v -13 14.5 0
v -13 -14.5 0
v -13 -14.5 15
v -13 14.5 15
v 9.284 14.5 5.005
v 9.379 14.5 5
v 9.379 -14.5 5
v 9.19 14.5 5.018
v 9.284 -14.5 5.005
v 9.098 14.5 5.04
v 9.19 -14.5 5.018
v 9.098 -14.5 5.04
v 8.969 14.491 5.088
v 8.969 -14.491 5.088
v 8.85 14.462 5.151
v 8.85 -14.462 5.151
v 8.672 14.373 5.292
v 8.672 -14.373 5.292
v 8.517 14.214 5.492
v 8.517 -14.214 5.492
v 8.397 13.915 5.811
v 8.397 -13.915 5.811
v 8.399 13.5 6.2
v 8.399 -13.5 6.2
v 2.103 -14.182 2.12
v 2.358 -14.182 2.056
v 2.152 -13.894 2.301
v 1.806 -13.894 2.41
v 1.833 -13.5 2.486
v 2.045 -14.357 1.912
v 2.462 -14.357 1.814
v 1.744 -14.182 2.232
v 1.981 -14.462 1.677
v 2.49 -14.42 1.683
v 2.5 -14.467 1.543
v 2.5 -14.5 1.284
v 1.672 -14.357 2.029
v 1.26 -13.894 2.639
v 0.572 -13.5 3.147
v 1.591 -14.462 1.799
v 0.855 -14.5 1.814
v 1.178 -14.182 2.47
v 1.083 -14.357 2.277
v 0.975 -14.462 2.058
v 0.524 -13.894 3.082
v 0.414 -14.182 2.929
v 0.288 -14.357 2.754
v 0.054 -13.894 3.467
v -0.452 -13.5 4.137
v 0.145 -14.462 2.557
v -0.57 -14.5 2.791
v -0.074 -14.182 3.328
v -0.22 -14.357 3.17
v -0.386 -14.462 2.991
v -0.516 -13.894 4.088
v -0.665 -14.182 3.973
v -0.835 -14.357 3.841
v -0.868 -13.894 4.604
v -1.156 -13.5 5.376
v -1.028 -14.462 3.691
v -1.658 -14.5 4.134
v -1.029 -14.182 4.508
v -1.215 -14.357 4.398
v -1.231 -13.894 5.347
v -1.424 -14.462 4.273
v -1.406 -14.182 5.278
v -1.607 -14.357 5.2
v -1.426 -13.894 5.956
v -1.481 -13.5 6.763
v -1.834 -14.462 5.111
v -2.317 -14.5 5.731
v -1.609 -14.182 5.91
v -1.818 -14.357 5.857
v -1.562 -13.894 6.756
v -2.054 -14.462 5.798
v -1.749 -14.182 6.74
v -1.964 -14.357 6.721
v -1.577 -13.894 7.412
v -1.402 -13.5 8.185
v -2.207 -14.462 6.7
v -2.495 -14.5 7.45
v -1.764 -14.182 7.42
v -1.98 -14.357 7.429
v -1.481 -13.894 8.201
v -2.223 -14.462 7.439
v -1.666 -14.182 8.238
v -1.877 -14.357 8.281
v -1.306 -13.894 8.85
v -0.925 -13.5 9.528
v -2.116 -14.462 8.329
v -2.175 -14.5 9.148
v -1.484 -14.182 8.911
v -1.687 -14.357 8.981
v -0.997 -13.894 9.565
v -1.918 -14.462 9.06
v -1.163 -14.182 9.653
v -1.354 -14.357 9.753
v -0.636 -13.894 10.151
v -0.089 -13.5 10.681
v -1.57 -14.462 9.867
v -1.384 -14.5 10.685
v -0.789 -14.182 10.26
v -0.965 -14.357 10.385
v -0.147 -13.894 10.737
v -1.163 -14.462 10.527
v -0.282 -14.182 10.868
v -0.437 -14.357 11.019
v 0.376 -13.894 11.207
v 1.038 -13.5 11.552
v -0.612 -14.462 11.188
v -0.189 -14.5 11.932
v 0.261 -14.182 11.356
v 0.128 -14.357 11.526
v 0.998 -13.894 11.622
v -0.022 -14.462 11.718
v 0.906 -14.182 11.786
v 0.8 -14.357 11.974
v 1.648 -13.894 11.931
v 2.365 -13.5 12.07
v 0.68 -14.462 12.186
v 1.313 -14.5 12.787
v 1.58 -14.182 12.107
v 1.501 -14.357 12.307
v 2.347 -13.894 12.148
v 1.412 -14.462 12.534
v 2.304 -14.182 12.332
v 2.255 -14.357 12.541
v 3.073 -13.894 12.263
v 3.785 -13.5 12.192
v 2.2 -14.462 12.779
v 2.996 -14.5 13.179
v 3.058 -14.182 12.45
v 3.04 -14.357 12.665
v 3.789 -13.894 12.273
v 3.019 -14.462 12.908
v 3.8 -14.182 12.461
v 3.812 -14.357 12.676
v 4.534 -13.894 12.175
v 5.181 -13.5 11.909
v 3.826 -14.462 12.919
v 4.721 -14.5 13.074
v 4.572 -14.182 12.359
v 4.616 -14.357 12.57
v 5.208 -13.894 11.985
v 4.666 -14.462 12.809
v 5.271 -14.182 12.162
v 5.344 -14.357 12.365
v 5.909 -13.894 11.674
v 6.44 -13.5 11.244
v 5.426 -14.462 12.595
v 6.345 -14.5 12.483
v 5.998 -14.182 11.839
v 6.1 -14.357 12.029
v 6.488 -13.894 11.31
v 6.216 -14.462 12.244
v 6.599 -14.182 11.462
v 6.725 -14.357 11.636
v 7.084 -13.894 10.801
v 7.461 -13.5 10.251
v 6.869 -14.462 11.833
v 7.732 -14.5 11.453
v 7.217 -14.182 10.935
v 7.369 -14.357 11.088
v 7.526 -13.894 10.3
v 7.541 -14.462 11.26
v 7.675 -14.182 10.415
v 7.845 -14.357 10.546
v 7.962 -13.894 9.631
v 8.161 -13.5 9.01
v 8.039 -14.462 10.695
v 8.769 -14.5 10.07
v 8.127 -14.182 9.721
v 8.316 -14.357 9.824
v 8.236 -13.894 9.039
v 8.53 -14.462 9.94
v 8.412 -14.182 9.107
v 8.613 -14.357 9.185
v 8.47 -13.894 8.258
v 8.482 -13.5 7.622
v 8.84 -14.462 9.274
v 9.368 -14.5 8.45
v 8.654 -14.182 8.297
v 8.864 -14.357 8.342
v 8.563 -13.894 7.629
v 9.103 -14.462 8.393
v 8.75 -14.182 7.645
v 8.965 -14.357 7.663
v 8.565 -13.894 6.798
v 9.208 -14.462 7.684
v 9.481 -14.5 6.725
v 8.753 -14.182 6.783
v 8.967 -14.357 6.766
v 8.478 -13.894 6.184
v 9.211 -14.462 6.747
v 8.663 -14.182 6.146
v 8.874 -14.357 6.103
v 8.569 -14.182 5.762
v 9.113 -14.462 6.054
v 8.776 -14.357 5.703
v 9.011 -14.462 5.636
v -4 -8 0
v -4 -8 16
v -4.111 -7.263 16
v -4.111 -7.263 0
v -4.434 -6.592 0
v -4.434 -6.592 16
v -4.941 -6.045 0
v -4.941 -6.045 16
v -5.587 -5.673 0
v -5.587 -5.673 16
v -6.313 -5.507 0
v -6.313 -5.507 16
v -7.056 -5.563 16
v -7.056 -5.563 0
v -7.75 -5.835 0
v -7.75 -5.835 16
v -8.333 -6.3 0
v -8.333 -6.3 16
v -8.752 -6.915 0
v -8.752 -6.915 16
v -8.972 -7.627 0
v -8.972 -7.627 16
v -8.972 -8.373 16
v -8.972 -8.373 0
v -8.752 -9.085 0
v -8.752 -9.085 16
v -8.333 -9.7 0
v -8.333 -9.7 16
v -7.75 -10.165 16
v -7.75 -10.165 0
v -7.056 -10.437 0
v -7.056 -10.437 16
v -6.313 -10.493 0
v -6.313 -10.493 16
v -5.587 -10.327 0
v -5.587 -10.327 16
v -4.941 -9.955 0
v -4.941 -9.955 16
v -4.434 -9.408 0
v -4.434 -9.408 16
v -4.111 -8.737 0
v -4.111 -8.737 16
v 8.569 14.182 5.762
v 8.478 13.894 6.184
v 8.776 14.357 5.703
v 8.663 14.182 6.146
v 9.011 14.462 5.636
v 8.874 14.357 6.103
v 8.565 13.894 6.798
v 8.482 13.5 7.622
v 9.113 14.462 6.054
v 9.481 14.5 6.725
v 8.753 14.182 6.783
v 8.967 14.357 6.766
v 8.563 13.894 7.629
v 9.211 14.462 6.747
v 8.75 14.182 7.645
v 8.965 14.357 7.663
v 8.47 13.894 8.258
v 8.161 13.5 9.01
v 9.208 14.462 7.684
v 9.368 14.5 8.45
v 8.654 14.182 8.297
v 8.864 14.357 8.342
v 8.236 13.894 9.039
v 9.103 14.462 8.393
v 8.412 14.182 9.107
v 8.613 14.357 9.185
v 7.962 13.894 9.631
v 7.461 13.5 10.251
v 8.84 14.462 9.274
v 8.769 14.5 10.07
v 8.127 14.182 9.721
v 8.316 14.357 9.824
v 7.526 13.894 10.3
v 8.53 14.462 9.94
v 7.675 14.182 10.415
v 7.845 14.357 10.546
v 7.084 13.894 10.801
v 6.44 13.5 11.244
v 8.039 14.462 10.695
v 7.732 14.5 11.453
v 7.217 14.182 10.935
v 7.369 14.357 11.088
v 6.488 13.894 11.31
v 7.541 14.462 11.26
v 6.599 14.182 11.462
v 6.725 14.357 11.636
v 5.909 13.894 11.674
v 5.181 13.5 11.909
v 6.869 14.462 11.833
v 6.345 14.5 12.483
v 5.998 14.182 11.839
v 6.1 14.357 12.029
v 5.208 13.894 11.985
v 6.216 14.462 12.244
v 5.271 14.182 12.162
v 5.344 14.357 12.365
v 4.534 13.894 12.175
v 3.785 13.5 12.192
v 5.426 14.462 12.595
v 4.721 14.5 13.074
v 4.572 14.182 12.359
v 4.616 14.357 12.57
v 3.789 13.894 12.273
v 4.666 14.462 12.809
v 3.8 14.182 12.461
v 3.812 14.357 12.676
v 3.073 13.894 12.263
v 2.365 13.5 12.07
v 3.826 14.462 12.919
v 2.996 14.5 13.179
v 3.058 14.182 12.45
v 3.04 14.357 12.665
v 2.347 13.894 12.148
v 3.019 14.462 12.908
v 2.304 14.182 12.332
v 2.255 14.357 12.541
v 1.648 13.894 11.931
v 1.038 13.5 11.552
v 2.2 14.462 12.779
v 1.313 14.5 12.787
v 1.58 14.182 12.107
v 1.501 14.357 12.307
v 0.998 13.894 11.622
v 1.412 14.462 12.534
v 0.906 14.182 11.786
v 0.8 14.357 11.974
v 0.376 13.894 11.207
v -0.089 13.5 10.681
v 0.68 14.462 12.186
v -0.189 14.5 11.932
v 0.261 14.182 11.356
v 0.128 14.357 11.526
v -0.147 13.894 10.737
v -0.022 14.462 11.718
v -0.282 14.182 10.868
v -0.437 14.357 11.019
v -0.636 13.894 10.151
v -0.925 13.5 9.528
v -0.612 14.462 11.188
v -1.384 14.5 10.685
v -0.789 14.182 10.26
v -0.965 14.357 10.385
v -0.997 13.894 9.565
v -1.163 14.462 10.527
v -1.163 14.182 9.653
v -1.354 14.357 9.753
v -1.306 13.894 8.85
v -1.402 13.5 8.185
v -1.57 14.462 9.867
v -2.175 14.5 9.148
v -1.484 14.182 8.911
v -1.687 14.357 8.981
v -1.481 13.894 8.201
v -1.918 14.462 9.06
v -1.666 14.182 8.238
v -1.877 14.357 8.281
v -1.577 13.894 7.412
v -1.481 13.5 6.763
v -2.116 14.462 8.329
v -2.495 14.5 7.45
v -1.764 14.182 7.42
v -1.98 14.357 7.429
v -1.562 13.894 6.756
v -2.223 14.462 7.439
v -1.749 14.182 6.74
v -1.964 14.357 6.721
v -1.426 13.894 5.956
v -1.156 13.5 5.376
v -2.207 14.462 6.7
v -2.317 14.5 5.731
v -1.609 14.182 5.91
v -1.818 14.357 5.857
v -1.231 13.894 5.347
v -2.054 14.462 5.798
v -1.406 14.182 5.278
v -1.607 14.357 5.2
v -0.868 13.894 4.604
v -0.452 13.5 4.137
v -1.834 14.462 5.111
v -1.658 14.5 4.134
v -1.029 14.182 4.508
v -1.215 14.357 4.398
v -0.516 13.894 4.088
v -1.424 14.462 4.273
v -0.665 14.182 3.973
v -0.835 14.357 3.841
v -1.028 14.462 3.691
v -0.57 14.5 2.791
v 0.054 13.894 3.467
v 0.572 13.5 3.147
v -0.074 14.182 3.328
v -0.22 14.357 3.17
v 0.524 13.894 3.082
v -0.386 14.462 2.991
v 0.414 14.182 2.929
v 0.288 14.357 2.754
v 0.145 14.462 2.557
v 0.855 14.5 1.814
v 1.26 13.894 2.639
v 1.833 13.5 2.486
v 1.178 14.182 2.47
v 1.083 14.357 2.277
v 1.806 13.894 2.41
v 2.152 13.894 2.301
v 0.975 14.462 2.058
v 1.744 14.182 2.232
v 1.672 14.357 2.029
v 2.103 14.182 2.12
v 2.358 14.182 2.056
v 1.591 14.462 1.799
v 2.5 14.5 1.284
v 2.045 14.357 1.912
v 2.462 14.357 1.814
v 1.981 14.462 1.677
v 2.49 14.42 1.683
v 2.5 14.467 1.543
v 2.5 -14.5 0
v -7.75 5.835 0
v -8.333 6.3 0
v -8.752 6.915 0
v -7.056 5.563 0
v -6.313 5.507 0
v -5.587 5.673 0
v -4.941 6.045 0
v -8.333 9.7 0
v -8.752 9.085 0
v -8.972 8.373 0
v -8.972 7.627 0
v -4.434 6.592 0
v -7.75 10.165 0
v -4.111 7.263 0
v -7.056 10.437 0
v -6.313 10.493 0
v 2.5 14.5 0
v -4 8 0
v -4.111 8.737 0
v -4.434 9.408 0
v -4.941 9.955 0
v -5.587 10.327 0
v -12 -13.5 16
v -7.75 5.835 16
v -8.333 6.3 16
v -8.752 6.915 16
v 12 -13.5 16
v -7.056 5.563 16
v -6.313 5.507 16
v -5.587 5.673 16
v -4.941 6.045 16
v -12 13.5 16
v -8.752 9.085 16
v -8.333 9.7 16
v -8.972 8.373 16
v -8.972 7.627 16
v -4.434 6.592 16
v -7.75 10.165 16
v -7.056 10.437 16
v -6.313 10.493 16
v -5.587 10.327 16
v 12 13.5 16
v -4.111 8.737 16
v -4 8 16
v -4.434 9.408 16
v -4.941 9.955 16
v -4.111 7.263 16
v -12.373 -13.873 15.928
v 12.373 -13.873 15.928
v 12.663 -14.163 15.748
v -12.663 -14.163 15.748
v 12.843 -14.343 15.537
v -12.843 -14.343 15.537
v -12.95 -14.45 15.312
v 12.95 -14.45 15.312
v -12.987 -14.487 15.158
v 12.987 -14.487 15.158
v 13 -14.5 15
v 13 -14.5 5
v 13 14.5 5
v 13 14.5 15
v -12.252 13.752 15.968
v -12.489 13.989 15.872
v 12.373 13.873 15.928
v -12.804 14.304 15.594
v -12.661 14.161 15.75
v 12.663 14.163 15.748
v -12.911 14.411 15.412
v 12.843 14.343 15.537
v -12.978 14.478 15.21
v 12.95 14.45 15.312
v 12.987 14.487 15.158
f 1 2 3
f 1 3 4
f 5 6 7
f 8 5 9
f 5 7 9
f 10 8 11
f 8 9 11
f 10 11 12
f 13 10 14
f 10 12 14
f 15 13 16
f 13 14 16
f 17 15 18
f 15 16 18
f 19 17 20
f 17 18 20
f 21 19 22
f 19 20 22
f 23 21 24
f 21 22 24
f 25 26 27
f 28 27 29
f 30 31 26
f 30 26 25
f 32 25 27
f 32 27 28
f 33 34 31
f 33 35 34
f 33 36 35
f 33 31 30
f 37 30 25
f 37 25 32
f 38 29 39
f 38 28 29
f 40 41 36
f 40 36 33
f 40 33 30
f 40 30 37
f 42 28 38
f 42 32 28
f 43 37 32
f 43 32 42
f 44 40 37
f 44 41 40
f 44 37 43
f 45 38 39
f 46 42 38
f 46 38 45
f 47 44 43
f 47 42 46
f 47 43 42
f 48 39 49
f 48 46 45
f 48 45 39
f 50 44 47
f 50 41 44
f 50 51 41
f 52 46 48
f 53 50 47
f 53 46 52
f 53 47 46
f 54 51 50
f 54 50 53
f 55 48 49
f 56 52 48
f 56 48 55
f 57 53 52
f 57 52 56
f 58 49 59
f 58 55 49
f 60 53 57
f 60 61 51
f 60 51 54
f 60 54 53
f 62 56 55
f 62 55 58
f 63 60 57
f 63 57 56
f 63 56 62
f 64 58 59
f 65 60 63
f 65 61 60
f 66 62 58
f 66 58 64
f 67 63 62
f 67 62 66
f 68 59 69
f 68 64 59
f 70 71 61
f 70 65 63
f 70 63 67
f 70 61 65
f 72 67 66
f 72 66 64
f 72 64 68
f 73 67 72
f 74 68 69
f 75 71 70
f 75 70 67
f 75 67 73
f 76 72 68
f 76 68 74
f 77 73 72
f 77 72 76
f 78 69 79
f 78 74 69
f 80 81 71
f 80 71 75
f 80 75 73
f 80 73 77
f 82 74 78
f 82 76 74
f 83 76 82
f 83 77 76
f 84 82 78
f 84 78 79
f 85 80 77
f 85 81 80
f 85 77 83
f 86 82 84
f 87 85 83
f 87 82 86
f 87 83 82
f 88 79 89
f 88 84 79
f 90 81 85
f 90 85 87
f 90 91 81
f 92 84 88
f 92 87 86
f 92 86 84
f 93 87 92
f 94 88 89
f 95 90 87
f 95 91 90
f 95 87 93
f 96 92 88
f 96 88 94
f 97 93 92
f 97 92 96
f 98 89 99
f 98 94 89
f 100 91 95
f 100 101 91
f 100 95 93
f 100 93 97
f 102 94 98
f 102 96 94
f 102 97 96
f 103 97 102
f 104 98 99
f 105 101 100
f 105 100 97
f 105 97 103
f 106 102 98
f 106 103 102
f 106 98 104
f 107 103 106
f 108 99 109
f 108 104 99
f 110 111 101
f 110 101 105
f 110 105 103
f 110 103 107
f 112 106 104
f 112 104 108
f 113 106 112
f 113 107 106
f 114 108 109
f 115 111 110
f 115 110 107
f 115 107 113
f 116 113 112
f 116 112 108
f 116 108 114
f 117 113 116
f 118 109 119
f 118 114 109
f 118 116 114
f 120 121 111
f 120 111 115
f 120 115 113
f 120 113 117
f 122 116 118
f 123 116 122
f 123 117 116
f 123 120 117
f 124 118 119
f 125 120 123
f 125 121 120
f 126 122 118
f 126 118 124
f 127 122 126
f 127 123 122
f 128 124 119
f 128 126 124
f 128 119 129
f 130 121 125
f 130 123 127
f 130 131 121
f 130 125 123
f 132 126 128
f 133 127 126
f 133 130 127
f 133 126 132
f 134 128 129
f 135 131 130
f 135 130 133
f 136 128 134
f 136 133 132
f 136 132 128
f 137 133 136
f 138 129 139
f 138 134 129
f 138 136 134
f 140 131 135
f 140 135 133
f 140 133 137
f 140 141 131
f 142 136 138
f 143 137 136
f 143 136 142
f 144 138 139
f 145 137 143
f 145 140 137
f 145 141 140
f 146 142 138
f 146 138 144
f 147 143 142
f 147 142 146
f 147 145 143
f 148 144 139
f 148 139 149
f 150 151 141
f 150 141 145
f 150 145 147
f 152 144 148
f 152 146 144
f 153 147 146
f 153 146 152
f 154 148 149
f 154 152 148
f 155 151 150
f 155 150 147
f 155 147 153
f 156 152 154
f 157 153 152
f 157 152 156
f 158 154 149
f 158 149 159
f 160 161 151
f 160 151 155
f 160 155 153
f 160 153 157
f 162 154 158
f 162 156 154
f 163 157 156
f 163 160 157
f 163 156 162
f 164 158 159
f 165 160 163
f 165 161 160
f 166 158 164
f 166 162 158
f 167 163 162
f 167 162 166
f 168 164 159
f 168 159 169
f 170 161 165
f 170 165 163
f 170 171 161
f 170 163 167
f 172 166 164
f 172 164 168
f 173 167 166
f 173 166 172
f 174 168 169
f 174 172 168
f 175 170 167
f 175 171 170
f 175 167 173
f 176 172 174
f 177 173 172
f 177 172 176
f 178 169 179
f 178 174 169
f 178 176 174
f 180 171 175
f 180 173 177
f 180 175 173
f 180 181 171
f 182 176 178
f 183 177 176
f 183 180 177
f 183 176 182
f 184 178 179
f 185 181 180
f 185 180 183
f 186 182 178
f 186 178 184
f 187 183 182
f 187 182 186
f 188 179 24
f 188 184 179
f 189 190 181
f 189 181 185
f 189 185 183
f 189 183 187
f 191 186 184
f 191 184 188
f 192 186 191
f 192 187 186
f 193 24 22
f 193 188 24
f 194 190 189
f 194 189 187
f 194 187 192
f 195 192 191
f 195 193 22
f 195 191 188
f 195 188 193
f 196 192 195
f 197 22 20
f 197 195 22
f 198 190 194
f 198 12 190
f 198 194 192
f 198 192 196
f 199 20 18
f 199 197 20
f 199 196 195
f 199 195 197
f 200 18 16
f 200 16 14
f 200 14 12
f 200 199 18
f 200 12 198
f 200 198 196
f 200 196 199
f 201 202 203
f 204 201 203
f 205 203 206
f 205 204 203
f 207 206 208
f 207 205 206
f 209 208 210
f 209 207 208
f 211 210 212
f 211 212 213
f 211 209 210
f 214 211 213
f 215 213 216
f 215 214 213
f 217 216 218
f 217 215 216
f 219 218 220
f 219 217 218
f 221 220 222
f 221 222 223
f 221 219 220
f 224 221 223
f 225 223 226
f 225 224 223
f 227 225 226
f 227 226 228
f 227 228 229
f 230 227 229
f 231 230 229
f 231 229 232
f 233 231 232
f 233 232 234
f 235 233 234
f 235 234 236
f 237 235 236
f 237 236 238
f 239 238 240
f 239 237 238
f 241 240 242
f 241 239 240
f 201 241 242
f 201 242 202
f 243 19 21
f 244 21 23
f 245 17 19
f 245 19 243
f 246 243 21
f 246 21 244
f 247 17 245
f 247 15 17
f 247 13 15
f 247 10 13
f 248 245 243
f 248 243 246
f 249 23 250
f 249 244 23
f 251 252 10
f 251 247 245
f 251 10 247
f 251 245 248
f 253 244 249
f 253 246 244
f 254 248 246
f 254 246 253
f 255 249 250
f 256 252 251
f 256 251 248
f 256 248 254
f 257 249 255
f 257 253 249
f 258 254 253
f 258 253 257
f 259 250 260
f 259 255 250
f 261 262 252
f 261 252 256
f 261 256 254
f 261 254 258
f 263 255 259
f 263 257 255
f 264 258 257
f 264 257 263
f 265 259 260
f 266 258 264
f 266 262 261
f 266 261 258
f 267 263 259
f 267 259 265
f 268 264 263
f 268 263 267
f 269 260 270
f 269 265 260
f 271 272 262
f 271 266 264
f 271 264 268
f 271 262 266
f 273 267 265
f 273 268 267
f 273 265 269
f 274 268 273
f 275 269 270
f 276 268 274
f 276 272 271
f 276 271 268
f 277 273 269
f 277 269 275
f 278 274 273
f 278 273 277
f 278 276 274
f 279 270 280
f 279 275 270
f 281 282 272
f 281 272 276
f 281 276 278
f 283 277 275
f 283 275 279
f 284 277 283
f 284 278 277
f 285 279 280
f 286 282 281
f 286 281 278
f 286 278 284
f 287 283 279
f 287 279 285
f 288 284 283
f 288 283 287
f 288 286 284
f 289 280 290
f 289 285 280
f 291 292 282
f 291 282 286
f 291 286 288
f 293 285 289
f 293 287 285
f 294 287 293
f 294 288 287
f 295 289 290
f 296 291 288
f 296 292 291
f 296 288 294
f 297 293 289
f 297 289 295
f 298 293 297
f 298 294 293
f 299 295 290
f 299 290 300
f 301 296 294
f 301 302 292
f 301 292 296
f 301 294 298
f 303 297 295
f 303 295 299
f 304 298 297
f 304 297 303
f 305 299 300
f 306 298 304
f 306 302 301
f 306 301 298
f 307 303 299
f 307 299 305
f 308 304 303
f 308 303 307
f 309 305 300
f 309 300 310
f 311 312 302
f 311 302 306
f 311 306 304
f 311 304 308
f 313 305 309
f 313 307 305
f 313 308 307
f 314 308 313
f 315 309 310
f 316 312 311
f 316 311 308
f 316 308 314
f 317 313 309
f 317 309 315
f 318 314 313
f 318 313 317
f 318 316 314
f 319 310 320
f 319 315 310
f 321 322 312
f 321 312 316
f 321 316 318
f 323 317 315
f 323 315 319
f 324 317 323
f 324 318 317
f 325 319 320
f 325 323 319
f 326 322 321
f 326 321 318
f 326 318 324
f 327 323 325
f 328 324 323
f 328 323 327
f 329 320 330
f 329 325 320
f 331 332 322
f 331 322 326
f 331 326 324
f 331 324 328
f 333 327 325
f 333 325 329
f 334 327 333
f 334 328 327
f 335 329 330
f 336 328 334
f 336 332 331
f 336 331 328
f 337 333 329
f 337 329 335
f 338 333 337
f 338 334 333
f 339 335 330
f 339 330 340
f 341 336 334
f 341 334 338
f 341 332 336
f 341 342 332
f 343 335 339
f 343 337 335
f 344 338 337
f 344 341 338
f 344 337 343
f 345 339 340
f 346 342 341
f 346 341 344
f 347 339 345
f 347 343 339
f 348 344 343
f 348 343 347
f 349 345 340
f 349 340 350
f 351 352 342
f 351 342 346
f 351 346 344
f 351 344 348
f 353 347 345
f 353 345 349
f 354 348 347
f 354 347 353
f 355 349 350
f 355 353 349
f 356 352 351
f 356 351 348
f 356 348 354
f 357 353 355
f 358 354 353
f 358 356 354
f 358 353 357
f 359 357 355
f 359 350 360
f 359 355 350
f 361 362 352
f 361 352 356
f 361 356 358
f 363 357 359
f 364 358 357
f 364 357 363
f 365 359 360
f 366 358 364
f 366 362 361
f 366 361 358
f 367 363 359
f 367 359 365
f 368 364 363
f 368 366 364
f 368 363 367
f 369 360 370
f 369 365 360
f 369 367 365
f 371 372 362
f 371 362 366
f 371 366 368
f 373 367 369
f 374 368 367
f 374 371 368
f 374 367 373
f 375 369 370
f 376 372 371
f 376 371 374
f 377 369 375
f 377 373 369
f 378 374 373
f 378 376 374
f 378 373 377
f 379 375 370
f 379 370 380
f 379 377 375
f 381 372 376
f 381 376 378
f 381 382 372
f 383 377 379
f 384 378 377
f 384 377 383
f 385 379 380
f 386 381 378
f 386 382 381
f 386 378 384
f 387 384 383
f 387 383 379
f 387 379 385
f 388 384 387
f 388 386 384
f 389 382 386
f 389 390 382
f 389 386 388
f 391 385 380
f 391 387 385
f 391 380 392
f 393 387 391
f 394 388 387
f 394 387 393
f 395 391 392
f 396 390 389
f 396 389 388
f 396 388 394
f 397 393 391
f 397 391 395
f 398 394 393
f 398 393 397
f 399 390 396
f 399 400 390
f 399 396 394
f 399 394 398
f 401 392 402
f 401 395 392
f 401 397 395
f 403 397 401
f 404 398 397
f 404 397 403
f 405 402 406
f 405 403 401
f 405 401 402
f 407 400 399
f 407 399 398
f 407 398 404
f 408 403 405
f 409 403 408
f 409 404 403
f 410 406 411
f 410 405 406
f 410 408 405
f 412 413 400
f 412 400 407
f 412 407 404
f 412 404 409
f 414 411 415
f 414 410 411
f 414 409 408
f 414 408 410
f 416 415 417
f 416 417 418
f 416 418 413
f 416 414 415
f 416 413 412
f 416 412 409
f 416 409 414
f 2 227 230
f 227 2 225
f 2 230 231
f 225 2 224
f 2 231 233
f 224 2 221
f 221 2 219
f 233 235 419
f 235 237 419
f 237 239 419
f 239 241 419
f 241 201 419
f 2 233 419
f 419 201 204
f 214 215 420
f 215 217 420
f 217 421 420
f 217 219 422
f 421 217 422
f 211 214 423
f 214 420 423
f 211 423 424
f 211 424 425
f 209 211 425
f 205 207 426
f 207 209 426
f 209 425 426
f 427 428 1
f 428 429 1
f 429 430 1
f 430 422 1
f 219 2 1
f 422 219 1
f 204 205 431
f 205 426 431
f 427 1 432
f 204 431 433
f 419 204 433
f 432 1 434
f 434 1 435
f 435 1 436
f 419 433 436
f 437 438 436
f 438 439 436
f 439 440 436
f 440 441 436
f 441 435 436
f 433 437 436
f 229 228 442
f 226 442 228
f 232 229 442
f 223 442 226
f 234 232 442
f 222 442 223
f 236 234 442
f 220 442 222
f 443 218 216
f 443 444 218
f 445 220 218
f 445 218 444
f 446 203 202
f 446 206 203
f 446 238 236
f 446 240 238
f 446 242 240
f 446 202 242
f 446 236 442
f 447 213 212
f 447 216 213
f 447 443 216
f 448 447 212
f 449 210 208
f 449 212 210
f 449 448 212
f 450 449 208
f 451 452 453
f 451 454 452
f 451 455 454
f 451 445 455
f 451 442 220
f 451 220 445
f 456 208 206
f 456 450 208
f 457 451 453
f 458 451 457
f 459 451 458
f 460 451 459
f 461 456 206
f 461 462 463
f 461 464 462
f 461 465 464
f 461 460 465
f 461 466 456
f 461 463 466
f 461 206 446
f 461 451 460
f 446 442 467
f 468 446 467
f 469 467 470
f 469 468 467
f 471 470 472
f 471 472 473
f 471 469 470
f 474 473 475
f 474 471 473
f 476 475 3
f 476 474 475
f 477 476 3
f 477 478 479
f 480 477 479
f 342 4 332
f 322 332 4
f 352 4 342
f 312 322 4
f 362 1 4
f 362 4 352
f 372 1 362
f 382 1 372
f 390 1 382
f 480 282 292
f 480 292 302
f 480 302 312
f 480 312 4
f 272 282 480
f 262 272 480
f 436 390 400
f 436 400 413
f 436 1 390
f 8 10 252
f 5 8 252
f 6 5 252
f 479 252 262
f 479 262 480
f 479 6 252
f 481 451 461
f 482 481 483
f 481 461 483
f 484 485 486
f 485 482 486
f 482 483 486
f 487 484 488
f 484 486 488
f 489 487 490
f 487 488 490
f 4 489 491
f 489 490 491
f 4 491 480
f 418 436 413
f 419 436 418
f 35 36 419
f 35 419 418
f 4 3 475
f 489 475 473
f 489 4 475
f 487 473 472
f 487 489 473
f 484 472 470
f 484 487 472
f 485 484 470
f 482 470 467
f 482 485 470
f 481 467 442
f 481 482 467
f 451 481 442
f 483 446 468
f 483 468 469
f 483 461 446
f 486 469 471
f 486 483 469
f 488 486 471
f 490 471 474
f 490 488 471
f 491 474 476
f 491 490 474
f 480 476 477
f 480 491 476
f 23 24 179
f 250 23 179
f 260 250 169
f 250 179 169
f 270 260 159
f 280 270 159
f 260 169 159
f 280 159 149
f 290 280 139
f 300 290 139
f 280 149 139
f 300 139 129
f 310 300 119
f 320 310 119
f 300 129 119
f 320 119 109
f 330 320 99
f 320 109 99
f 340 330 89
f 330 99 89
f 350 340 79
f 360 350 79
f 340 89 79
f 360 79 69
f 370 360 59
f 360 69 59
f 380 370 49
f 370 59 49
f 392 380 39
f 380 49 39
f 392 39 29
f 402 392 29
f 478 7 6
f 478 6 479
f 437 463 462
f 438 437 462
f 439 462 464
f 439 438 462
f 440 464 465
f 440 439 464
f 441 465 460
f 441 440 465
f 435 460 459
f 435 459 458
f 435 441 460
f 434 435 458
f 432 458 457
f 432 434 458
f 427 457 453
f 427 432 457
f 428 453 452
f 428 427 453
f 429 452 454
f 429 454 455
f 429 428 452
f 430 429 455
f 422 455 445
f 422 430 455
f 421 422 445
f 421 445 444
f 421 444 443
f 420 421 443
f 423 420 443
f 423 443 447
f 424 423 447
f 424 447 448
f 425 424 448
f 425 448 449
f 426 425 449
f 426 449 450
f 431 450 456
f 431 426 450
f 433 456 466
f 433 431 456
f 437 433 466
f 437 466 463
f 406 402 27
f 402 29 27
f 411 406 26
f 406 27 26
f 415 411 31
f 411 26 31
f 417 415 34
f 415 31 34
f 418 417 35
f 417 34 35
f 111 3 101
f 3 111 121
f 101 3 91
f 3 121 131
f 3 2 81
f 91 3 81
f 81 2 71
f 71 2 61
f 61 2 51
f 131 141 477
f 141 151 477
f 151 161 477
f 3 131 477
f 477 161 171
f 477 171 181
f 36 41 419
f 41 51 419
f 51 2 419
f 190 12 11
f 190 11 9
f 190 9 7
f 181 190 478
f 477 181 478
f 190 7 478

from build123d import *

# Parameters (mm, degrees)
F0_W     = 26
F0_H     = 29
F0_R     = 2.5
F1_DEPTH = 16
F2_R     = 5
F3_DEPTH = 60
F4_W     = 10.5
F4_H     = 5
F5_DEPTH = 60
F6_R     = 1


with BuildPart() as f1:
    # F0 (on Top) → F1 (new body)
    with BuildSketch(Plane.XY):
        Rectangle(F0_W, F0_H)
        with Locations((-6.5, -8)):
            Circle(F0_R, mode=Mode.SUBTRACT)
        with Locations((-6.5, 8)):
            Circle(F0_R, mode=Mode.SUBTRACT)
    extrude(amount=F1_DEPTH)

    # F2 (on face) → F3 (cut)
    with BuildSketch(Plane.XZ.offset(14.5)):
        with Locations((3.5, 7.2)):
            Circle(F2_R)
    extrude(amount=-F3_DEPTH, mode=Mode.SUBTRACT)

    # F4 (on face) → F5 (cut)
    with BuildSketch(Plane.XZ.offset(14.5)):
        with Locations((7.75, 2.5)):
            Rectangle(F4_W, F4_H)
    extrude(amount=-F5_DEPTH, mode=Mode.SUBTRACT)

    # F6
    f6_edges = [f1.edges().sort_by_distance(p)[0] for p in [
        (0, -14.5, 16),
        (-13, 0, 16),
        (13, 0, 16),
        (0, 14.5, 16),
        (7.989989, 0, 5),
        (2.5, 0, 2.301021),
        (1.29407, -14.5, 11.687078),
        (1.29407, 14.5, 11.687078),
    ]]
    fillet(f6_edges, radius=F6_R)


solid = f1.part
